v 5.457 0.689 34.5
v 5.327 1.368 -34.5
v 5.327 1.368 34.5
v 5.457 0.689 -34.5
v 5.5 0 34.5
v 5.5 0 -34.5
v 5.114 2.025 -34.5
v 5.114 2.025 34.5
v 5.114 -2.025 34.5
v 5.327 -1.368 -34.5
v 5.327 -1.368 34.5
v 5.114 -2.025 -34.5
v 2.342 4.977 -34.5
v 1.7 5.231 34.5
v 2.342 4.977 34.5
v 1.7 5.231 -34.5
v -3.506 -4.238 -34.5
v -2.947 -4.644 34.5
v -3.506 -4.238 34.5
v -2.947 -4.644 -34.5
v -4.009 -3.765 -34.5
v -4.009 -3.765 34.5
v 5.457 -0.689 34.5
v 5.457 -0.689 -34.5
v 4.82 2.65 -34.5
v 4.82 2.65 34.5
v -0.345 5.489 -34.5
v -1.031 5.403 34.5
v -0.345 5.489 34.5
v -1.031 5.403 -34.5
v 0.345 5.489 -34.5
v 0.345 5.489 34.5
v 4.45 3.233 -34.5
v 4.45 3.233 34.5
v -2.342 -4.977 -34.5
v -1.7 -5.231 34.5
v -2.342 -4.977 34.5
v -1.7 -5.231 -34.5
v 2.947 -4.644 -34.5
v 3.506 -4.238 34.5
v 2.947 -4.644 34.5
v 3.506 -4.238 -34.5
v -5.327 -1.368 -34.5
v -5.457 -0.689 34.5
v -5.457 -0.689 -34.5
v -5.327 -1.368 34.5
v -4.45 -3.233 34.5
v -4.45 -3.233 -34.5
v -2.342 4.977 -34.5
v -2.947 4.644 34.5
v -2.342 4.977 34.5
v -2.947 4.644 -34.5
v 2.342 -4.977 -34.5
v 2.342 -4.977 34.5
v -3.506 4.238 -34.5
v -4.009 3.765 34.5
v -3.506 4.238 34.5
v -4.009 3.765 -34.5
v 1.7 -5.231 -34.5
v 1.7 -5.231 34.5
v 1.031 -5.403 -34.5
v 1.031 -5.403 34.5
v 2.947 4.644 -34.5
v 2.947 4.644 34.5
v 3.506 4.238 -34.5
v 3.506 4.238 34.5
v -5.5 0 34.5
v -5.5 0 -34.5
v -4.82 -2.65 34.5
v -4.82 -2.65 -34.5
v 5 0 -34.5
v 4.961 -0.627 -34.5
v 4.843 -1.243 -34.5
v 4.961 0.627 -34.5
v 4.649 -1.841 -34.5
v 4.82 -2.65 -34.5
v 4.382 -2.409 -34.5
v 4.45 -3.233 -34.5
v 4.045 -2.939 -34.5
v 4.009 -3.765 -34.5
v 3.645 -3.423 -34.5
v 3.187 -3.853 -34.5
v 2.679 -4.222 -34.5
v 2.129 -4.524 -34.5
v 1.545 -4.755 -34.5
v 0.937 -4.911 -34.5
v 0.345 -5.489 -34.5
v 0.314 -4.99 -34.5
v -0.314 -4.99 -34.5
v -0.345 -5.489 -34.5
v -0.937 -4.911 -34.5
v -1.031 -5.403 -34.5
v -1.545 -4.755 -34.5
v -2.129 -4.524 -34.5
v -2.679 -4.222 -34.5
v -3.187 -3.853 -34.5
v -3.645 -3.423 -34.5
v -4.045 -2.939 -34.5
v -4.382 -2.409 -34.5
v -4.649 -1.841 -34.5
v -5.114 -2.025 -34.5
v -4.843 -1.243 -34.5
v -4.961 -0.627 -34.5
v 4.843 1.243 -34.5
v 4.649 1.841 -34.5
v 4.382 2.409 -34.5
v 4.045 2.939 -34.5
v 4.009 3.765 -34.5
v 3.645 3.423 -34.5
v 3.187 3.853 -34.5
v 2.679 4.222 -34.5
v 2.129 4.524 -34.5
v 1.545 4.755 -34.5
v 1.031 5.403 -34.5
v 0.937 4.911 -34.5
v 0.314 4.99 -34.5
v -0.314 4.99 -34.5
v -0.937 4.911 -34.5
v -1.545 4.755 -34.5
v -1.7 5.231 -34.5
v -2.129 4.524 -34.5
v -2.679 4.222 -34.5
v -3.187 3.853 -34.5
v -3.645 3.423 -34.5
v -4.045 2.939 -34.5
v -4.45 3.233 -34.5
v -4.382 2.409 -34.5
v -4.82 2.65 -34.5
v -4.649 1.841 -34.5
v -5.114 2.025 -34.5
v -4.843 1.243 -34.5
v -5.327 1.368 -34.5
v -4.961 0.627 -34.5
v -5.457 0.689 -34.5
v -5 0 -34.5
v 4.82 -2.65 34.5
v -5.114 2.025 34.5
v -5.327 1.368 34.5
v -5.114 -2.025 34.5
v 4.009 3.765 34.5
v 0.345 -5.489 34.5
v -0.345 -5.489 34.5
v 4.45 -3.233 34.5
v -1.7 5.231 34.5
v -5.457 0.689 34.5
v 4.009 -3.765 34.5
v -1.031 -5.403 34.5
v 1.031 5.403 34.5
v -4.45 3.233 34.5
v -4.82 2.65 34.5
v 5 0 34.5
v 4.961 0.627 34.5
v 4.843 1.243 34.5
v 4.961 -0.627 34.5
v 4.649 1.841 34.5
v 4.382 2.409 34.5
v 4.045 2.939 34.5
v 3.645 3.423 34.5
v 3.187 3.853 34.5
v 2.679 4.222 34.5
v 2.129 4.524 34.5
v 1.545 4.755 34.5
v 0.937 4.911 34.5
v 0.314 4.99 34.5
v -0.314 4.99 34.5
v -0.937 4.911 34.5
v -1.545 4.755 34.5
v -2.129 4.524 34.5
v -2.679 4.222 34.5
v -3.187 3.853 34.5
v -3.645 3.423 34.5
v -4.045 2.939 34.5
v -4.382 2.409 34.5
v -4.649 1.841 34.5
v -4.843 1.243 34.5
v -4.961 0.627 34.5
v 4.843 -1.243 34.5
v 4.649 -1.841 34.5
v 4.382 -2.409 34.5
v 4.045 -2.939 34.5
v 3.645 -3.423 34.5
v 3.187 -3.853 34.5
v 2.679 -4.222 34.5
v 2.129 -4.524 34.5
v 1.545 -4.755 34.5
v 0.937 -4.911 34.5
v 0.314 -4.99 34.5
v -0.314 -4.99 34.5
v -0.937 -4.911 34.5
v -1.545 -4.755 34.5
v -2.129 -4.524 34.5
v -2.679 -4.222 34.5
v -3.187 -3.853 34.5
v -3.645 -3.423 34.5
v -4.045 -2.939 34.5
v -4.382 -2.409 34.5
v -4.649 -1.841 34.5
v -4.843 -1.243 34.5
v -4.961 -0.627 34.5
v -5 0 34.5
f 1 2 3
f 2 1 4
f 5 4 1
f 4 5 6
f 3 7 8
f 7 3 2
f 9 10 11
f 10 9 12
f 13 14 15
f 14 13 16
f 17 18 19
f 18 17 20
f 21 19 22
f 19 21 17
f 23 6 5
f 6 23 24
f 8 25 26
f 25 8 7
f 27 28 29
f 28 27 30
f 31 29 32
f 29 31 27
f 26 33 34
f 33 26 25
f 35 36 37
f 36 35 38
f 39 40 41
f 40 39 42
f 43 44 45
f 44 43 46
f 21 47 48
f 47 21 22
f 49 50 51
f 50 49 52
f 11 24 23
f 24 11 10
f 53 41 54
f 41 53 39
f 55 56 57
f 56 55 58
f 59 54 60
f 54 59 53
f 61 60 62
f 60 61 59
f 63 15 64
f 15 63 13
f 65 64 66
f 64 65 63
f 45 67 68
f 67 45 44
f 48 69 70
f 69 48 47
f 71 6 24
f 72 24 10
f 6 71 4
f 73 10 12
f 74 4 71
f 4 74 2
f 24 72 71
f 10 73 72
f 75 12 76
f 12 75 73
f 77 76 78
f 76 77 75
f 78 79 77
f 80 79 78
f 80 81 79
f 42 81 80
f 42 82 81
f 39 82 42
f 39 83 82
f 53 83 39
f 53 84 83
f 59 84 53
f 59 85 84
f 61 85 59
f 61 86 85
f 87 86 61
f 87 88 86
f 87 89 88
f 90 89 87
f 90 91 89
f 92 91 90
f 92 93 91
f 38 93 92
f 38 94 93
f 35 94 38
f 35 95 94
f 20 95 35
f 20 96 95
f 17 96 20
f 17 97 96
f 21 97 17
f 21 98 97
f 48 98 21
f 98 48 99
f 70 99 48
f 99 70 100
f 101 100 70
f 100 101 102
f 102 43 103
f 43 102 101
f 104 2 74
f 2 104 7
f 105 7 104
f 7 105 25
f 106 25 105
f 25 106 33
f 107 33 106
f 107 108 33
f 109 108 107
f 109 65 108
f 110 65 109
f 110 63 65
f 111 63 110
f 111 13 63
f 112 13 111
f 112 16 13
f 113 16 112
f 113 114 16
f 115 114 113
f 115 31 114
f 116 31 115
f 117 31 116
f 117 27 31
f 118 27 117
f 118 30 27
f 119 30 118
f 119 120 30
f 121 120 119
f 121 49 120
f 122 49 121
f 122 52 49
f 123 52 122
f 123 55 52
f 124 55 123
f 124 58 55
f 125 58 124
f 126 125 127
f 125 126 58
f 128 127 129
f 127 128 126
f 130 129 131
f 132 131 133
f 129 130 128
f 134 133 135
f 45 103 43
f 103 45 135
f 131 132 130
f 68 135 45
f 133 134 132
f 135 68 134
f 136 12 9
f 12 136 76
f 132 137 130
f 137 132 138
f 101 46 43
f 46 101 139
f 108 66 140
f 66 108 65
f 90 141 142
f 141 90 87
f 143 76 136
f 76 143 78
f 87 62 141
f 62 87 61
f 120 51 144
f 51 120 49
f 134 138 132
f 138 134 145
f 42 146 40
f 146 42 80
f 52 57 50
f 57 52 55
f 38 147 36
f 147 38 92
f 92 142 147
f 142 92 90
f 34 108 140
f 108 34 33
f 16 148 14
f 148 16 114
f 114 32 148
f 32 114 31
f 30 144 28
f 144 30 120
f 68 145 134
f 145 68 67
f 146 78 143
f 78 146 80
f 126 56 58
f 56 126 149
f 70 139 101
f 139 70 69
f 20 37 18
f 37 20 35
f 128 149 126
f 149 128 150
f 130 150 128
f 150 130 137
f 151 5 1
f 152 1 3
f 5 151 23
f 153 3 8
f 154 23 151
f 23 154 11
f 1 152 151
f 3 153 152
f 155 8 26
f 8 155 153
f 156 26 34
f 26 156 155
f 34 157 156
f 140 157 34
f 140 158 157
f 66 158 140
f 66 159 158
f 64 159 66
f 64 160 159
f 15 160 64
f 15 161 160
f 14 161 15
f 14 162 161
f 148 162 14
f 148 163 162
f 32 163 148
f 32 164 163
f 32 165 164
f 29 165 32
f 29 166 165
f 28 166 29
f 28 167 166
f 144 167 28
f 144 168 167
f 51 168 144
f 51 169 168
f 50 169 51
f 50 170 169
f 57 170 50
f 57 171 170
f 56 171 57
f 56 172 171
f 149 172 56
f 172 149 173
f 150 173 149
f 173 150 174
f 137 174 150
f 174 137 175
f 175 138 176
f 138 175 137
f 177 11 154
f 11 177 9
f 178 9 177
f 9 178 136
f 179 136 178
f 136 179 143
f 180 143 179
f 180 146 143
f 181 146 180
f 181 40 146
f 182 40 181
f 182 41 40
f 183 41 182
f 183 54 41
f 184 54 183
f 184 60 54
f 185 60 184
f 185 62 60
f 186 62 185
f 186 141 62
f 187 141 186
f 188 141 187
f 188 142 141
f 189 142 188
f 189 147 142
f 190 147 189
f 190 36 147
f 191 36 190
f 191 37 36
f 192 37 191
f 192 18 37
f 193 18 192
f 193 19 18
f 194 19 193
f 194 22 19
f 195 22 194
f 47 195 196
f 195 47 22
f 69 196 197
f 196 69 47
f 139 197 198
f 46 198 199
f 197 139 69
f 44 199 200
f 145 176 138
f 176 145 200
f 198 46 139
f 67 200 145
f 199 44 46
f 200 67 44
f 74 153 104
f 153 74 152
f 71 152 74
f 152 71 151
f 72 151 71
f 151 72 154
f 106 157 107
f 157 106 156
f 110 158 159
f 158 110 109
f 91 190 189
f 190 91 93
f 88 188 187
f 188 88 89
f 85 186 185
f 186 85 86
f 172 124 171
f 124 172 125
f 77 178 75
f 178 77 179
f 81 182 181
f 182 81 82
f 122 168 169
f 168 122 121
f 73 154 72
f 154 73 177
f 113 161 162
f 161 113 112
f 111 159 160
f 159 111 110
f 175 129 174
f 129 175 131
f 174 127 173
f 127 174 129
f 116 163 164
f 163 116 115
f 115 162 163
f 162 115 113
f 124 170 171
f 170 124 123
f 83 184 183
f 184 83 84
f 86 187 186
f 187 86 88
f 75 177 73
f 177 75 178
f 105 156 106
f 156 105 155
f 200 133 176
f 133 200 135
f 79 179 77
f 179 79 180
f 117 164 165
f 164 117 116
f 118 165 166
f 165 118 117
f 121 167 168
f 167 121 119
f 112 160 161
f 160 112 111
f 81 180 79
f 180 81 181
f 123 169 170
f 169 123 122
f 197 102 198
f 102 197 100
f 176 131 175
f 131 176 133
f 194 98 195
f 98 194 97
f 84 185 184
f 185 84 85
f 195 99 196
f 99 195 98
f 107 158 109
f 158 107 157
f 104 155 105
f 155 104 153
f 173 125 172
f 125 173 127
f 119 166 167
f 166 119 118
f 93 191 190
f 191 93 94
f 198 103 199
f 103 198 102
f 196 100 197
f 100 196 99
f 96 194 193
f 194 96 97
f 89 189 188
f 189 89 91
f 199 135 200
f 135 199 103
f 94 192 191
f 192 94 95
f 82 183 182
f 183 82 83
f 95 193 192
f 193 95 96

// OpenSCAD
$fn = 50;


difference() {
	union() {
		translate(v = [0, 0, -34.5000000000]) {
			cylinder(h = 69, r = 5.5000000000);
		}
	}
	union() {
		translate(v = [0, 0, -100.0000000000]) {
			cylinder(h = 200, r = 5.0000000000);
		}
	}
}
